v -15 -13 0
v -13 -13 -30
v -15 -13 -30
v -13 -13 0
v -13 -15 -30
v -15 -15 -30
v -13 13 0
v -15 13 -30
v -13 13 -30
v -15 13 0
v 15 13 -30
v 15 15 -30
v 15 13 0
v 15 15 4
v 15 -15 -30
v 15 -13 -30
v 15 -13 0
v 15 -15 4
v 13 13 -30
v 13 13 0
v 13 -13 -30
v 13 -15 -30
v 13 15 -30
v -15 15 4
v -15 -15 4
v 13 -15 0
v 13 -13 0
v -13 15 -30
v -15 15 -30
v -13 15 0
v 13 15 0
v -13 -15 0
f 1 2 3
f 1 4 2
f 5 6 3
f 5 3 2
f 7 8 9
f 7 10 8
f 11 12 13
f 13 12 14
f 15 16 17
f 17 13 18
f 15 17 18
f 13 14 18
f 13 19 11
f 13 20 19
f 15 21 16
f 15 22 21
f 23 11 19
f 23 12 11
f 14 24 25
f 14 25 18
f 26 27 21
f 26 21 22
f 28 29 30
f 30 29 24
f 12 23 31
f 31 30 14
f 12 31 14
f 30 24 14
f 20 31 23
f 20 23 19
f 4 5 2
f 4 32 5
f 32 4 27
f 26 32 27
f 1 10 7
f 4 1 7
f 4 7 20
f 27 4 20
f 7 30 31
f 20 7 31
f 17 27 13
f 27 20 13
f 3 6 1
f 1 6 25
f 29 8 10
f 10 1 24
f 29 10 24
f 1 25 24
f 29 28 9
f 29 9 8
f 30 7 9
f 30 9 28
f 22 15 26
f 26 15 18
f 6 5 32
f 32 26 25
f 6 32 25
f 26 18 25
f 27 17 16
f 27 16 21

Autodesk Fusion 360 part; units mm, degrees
sketch "Sketch1" plane through (0, 0, 0) normal (0, 0, 1) x (1, 0, 0)
  line L0 (15, -15) -> (-15, -15)
  line L1 (-15, -15) -> (-15, 15)
  line L2 (-15, 15) -> (15, 15)
  line L3 (15, 15) -> (15, -15)
  line L4 (15, -15) -> (-15, 15) construction
  line L5 (-15, -15) -> (15, 15) construction
  dimension "d1" = 30
  dimension "d2" = 30
extrude "Extrude1" add sketch "Sketch1" along normal blind 4
sketch "Sketch2" plane through (0, 0, 0) normal (0, 0, -1) x (1, 0, 0)
  line L0 (-15, -15) -> (15, -15)
  line L1 (15, -15) -> (15, 15)
  line L2 (15, 15) -> (-15, 15)
  line L3 (-15, 15) -> (-15, -15)
  line L4 (-15, 15) -> (-13, 15)
  line L5 (-13, 13) -> (-15, 13)
  line L6 (-13, 15) -> (-13, 13)
extrude "Extrude2" add sketch "Sketch2" along normal blind 30 contours L2 L3 L4 L5 L6
mirror "Mirror1" about plane through (0, 0, 0) normal (1, 0, 0) of "Extrude2"
mirror "Mirror2" about plane through (0, 0, 0) normal (0, 1, 0) of "Extrude2", "Mirror1"
